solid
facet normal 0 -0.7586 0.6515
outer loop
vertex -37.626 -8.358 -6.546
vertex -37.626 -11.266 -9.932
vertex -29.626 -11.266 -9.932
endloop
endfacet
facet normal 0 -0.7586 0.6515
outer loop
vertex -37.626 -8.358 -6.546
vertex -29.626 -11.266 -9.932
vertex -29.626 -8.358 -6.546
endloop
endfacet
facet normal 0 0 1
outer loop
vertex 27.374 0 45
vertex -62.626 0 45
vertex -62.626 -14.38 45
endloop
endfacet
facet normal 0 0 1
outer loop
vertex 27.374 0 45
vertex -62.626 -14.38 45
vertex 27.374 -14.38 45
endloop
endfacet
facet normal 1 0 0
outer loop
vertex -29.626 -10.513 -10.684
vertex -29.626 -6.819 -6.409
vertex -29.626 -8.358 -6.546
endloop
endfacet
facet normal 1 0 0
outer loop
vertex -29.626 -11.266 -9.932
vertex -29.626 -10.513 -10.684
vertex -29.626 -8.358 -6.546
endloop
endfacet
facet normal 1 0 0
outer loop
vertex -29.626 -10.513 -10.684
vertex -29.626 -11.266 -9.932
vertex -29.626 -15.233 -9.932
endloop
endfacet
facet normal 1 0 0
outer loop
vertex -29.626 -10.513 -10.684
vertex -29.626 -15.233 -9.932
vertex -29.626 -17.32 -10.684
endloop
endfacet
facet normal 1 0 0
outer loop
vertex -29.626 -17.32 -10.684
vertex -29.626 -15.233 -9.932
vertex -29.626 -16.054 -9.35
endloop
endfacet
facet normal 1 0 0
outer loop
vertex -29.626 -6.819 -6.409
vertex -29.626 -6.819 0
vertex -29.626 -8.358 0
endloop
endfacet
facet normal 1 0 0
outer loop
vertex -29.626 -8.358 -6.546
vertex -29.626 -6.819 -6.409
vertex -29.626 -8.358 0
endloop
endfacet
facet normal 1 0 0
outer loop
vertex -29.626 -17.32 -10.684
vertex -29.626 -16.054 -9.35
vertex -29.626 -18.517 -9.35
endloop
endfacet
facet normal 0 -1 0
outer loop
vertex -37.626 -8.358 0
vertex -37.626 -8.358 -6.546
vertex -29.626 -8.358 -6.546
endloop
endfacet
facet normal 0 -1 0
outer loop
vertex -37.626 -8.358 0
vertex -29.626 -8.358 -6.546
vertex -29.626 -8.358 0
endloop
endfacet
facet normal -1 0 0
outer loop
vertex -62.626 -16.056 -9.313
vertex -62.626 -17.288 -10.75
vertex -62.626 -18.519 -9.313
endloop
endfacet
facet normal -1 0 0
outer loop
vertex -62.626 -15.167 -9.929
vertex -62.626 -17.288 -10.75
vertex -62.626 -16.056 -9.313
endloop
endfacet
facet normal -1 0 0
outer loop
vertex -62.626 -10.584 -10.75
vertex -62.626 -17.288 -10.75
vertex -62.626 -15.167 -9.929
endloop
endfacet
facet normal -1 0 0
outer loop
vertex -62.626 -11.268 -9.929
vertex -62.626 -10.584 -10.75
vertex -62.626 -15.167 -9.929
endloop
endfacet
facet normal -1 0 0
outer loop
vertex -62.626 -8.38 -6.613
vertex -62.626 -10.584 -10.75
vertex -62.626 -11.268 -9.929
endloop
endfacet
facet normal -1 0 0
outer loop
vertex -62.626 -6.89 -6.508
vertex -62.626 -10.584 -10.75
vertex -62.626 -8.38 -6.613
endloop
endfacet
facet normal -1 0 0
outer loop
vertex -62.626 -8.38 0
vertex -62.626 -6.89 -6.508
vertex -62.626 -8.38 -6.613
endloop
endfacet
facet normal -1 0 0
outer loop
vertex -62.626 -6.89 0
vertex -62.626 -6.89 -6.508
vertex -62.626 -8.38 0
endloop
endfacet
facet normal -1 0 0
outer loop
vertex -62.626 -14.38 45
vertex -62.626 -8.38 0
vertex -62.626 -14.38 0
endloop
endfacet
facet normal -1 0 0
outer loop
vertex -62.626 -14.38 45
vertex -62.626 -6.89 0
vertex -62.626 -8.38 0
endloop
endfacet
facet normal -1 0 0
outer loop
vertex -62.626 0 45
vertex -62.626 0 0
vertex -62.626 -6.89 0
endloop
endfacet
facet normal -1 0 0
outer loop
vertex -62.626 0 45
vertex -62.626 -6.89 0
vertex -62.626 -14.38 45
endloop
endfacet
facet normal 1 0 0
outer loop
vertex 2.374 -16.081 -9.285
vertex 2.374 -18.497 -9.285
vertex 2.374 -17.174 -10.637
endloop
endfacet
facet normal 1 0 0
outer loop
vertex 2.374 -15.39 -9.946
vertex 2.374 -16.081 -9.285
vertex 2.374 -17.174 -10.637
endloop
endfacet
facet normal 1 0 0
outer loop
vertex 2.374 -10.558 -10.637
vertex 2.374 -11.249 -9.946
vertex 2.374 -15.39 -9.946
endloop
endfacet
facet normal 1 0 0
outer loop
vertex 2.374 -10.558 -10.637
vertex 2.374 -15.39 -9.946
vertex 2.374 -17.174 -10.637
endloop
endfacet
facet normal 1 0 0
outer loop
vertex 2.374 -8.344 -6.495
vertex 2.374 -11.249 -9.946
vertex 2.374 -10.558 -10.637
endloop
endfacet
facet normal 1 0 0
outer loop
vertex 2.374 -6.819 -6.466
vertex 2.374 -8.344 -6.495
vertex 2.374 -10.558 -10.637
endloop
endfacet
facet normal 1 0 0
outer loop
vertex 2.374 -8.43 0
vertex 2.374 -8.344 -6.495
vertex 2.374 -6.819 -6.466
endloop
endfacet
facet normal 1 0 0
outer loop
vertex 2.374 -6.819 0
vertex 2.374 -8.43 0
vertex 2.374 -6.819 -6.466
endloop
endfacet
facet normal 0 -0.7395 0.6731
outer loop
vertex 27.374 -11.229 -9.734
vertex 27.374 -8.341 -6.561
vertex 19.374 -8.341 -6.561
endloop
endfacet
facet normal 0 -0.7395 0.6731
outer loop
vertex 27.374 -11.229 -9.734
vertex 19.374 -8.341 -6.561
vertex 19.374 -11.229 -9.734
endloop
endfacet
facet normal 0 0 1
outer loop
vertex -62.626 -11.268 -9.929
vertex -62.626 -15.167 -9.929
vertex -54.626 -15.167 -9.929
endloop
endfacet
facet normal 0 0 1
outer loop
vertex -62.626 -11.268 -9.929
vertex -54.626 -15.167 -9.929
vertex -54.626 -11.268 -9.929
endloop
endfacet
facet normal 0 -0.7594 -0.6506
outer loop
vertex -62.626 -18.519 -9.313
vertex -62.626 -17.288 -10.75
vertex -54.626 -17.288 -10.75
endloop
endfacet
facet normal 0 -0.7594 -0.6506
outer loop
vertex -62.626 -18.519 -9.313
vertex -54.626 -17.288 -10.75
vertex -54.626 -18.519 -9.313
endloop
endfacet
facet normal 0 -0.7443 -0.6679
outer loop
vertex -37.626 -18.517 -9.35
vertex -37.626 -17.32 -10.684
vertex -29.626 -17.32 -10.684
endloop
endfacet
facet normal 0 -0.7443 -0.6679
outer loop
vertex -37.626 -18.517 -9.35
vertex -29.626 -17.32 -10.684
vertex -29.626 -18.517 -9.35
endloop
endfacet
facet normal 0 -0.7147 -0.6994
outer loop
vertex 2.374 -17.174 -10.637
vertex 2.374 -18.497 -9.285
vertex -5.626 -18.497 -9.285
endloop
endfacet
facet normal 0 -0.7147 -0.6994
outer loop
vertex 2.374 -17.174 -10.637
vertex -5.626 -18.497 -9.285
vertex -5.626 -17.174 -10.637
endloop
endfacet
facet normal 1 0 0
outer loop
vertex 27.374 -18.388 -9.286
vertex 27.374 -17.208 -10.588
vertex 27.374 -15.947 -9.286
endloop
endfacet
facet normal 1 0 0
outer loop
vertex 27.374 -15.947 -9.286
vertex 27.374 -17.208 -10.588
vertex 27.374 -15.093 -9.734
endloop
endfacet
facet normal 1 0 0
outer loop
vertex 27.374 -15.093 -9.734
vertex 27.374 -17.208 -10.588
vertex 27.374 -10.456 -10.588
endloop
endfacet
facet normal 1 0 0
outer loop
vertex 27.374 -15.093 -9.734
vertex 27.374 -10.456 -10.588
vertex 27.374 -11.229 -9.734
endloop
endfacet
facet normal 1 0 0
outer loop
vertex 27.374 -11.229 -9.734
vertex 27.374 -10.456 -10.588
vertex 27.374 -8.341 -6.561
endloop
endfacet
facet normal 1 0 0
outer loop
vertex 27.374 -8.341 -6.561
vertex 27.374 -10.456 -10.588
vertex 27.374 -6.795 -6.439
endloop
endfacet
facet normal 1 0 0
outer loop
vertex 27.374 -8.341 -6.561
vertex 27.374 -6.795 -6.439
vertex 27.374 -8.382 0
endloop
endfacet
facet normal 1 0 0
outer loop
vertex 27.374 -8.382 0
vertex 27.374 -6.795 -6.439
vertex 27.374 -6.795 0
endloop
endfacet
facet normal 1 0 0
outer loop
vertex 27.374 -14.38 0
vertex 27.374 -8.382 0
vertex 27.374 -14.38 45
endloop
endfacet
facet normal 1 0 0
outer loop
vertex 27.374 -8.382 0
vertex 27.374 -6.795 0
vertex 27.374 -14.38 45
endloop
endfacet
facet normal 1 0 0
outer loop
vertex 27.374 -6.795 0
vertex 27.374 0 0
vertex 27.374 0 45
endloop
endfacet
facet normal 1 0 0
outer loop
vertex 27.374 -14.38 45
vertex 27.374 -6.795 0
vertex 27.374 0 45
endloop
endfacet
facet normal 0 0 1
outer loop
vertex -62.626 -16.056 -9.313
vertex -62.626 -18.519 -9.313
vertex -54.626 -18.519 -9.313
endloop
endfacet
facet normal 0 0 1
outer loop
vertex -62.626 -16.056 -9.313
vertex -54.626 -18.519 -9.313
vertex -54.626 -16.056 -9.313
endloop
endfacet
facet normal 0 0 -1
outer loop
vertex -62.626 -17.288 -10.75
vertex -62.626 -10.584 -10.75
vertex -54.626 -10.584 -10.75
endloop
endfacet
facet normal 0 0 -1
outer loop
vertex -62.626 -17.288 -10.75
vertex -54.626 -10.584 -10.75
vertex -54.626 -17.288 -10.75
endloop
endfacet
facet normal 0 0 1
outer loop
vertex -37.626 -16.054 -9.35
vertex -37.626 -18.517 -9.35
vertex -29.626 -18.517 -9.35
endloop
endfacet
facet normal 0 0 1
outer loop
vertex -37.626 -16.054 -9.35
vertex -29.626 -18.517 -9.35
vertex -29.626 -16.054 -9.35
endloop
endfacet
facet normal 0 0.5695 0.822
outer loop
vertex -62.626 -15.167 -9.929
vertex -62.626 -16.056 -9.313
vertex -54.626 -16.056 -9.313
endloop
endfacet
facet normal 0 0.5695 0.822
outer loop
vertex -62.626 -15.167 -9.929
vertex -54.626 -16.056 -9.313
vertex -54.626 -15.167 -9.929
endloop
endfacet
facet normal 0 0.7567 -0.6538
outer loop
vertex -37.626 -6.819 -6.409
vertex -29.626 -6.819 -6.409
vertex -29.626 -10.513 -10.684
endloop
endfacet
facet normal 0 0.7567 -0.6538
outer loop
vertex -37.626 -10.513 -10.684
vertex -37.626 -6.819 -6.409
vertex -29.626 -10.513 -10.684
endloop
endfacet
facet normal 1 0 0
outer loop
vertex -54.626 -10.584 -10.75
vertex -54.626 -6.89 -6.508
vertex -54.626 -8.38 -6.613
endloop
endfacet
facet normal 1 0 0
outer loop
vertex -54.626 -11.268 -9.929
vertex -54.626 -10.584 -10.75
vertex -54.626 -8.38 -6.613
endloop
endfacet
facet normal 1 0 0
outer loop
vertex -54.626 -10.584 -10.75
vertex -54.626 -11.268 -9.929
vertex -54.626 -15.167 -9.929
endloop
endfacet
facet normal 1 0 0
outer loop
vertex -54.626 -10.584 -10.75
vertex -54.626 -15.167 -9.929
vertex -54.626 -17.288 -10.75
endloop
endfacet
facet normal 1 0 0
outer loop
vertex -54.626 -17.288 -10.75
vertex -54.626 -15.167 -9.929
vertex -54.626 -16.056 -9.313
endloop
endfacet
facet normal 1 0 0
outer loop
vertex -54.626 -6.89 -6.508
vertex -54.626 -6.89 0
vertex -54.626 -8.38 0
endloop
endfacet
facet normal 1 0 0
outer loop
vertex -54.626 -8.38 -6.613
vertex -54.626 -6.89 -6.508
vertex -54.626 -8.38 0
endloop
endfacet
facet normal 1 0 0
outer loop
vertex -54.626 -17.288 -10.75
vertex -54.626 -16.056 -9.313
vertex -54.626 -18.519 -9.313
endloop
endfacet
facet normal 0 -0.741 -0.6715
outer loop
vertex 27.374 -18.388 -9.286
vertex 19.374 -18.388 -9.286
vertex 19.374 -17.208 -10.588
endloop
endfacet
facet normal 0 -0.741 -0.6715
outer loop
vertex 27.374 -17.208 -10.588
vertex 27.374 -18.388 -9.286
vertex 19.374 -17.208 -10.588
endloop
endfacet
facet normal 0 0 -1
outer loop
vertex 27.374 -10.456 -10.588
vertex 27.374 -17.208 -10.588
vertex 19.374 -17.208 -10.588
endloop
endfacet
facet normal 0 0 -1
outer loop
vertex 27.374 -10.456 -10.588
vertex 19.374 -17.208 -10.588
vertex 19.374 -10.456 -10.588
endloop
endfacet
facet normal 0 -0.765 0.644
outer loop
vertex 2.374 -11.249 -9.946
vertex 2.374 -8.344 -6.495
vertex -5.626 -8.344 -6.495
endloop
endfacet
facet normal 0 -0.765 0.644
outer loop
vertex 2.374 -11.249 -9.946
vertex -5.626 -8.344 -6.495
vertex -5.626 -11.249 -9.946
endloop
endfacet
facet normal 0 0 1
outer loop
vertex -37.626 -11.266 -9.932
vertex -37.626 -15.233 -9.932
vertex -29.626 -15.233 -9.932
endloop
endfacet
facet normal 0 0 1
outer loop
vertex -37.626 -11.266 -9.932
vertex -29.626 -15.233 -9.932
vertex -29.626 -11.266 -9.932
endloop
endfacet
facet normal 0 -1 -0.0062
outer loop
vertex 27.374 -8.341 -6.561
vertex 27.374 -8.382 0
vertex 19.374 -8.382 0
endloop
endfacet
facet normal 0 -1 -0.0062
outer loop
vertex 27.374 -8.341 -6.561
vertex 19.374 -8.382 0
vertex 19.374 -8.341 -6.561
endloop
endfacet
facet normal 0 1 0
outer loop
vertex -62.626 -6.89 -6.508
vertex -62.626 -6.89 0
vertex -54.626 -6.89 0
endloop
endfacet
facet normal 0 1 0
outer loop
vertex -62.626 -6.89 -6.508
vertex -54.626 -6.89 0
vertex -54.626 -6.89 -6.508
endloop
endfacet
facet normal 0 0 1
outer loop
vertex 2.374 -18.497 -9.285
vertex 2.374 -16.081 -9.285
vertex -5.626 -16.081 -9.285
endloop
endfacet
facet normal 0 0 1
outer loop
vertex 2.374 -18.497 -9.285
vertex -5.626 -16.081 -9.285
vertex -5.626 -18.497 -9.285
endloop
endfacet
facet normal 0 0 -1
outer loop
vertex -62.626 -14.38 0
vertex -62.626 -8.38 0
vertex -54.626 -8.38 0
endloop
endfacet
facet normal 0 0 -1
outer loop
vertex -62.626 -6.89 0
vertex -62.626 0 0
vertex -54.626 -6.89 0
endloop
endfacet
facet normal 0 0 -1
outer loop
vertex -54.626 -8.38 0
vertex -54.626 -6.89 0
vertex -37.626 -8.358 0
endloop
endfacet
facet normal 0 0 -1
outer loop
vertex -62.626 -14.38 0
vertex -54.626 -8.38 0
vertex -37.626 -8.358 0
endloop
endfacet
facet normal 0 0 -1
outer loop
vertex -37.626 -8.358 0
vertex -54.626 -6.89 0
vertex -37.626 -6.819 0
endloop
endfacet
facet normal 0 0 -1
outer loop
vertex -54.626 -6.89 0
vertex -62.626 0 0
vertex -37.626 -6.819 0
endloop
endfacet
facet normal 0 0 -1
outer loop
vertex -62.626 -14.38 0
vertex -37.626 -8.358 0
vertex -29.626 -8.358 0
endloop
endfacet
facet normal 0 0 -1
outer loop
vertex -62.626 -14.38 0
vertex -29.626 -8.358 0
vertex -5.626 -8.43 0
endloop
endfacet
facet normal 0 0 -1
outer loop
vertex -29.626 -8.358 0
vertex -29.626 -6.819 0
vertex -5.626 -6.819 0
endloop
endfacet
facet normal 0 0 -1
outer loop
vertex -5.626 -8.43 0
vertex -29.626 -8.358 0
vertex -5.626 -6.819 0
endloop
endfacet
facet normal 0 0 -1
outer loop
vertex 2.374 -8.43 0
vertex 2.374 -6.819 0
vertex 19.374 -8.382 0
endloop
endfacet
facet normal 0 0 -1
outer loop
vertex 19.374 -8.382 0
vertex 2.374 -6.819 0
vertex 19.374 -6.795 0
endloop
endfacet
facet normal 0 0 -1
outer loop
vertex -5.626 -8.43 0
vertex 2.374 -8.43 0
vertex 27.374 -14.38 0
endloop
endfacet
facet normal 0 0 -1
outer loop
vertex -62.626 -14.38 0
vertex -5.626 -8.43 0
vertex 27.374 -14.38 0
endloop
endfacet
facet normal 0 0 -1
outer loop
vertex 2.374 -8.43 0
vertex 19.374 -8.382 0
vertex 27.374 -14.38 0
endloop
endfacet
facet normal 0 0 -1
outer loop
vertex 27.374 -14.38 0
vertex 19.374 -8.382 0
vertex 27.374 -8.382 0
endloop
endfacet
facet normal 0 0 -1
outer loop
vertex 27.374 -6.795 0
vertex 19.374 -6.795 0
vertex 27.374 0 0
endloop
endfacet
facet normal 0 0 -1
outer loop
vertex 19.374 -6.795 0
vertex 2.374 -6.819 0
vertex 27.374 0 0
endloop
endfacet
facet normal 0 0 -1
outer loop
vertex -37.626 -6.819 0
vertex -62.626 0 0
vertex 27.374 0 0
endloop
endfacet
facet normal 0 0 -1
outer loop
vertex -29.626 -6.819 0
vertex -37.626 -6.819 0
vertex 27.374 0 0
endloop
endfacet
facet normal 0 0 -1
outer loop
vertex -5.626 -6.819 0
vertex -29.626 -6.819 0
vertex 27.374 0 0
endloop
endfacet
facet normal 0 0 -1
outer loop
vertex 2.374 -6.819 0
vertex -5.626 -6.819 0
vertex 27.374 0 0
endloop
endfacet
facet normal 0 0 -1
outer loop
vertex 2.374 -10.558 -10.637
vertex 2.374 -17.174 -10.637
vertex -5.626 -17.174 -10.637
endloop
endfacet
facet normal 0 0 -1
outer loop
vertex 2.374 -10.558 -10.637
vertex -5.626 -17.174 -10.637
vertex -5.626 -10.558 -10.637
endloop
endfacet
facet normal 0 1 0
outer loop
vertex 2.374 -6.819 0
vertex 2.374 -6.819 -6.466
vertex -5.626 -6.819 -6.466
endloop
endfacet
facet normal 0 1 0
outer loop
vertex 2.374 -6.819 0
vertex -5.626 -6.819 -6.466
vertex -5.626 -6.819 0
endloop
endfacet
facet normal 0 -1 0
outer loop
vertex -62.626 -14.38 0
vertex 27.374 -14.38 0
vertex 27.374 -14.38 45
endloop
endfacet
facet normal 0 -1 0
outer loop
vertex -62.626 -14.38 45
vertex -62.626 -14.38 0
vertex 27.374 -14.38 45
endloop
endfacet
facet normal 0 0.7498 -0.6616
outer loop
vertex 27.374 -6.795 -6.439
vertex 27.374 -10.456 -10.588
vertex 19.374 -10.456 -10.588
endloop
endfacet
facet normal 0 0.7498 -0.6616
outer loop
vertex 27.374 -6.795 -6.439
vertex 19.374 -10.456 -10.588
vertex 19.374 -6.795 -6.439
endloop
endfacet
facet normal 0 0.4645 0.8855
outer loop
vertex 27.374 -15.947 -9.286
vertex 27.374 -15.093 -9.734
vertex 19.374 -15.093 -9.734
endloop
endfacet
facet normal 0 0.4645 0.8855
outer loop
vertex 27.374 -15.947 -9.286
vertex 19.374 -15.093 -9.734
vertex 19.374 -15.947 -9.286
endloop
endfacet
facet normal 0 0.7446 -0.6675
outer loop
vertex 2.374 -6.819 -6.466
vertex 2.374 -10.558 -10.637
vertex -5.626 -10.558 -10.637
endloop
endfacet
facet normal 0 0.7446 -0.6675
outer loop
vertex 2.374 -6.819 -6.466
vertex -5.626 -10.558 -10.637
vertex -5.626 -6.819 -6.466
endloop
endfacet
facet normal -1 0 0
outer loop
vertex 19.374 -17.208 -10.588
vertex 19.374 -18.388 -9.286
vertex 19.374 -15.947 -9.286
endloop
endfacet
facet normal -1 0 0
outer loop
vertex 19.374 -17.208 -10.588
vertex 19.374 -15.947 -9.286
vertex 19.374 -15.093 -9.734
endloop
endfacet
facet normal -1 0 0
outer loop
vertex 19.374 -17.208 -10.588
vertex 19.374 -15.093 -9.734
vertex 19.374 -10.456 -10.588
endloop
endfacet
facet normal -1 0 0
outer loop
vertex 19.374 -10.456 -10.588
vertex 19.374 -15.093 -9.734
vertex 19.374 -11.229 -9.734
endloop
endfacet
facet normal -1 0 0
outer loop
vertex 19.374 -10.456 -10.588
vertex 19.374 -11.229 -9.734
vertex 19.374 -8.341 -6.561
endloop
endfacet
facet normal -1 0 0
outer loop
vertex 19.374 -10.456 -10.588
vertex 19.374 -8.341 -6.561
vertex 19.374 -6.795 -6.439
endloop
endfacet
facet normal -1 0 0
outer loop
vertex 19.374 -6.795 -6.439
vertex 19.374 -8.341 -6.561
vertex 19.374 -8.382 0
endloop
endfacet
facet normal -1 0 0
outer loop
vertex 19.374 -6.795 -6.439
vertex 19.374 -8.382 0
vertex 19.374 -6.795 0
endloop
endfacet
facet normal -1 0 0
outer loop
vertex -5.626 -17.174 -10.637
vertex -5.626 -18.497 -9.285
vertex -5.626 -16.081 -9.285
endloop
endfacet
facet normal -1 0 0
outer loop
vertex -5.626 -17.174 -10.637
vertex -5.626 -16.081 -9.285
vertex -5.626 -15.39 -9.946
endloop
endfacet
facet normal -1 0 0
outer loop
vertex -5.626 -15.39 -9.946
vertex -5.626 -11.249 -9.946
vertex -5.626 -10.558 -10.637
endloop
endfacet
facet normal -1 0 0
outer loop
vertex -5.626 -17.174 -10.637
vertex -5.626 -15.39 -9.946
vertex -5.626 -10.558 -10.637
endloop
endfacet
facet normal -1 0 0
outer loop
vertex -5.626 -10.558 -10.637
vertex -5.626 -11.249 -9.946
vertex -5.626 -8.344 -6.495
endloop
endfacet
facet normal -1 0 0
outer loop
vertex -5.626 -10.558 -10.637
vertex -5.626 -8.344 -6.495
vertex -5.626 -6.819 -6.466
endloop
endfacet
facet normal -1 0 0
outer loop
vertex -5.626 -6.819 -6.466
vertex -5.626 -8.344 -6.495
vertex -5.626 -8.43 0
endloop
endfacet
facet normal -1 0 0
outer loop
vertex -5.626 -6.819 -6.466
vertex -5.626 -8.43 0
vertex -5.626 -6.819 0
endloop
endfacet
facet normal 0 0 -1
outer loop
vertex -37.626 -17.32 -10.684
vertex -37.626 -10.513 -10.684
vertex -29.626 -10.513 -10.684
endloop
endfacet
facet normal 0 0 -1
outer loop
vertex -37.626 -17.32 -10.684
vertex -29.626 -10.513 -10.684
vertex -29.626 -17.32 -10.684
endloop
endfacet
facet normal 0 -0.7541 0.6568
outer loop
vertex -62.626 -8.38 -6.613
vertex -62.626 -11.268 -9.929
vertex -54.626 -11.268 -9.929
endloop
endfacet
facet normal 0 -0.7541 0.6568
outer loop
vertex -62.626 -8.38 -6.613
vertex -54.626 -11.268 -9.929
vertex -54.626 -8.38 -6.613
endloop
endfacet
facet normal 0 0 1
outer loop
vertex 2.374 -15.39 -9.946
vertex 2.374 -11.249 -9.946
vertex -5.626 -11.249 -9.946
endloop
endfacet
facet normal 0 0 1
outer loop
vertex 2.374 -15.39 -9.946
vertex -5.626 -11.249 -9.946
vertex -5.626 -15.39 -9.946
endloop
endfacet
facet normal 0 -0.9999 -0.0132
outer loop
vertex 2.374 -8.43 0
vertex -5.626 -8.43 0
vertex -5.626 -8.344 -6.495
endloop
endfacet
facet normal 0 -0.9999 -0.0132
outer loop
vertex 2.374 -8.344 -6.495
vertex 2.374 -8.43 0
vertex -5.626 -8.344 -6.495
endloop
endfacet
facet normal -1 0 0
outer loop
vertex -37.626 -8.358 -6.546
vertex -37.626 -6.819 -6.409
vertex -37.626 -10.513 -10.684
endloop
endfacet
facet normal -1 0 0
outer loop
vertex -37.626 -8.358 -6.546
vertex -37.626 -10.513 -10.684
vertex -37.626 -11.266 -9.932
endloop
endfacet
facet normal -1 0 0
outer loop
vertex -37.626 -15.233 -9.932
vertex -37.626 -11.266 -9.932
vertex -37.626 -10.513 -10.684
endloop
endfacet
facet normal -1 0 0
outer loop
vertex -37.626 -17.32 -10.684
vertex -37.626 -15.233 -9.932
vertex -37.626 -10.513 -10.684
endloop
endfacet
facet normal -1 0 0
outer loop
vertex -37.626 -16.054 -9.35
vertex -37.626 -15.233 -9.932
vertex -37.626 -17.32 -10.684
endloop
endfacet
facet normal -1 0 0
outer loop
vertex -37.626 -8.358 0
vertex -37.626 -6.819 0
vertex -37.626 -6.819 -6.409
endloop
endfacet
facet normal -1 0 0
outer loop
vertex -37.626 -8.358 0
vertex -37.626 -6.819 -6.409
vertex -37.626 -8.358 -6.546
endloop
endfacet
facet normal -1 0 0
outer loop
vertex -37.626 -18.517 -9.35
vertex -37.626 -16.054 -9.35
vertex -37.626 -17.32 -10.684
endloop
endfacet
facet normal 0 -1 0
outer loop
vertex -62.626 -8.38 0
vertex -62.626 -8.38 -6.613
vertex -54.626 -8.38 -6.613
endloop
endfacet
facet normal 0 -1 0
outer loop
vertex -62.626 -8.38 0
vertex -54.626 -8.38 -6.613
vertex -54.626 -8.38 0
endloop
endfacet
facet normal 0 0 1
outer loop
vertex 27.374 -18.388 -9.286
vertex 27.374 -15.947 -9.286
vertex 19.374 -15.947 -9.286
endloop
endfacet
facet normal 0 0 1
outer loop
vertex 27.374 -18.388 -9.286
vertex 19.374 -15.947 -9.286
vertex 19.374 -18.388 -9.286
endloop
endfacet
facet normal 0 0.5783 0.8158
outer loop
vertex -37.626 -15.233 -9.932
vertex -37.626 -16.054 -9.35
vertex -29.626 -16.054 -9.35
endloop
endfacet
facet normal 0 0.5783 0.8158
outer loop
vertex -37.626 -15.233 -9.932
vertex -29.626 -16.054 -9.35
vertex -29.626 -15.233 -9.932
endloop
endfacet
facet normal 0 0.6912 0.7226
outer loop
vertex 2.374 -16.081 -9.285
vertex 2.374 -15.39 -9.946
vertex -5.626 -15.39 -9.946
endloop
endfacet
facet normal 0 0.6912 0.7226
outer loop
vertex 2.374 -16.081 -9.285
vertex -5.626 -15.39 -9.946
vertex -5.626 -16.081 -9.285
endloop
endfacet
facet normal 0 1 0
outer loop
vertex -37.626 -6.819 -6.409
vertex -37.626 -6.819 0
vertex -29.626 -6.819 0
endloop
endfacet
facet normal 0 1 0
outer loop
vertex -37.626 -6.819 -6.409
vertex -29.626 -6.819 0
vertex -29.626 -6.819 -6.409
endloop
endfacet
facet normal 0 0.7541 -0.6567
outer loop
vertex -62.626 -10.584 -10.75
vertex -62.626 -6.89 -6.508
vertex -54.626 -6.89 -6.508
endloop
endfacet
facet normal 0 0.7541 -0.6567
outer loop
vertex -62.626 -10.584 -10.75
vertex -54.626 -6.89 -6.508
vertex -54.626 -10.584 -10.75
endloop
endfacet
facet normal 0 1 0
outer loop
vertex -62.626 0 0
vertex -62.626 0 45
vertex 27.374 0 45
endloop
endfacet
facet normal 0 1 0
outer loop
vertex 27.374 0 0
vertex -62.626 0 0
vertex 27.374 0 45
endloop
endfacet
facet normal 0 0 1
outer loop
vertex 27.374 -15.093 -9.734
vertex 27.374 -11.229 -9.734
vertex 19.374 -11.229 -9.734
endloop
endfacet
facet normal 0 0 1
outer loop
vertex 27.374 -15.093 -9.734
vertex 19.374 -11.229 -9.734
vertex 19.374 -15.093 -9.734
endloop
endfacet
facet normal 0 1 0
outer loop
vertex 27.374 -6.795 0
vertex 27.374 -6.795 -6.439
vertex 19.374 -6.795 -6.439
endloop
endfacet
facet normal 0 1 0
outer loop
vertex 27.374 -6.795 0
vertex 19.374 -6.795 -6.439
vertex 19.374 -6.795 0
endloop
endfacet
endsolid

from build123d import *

# Parameters (mm, degrees)
F0_W      = 90
F0_H      = 45
F1_DEPTH  = 25
F3_DEPTH  = 8
F6_DEPTH  = 8
F8_DEPTH  = 8
F11_DEPTH = 8
F13_DEPTH = 100


with BuildPart() as f1:
    # F0 (on Front) → F1 (new body)
    with BuildSketch(Plane.XZ):
        with Locations((-17.625819491, 22.5)):
            Rectangle(F0_W, F0_H)
    extrude(amount=F1_DEPTH)

    # F2 (on face) → F3 (join)
    with BuildSketch(Plane(origin=(-62.625819491, 0, 0), x_dir=(0, -1, 0), z_dir=(-1, 0, 0))):
        Polygon((8.3801829397, 0), (6.88952161, 0), (6.88952161, -6.5082041547), (10.5835897848, -10.7495421544), (17.287639901, -10.7495421544), (18.5189954937, -9.3129593879), (16.0562843084, -9.3129593879), (15.1669709012, -9.9286381155), (11.2676769495, -9.9286381155), (8.3801829397, -6.6133668514), align=None)
    extrude(amount=-F3_DEPTH)

    # F5 (on offset) → F6 (join)
    with BuildSketch(Plane(origin=(-37.625819491, 0, 0), x_dir=(0, -1, 0), z_dir=(-1, 0, 0))):
        Polygon((8.3582568914, 0), (6.8190610036, 0), (6.8190610036, -6.4087822102), (10.5131296441, -10.6843244284), (17.3197928816, -10.6843244284), (18.5169447213, -9.3503547832), (16.0542316735, -9.3503547832), (15.233328566, -9.931829758), (11.2656243145, -9.931829758), (8.3582568914, -6.5456000157), align=None)
    extrude(amount=-F6_DEPTH)

    # F7 (on face) → F8 (join)
    with BuildSketch(Plane.YZ.offset(27.374180509)):
        Polygon((-6.7952279933, 0), (-8.3815939724, 0), (-8.3409175277, -6.5609556623), (-11.2289162353, -9.7336871549), (-15.0931403041, -9.7336871549), (-15.9473381937, -9.2862509191), (-18.3878988028, -9.2862509191), (-17.208294943, -10.5878841132), (-10.4560721666, -10.5878841132), (-6.7952279933, -6.438927725), align=None)
    extrude(amount=-F8_DEPTH)

    # F10 (on offset) → F11 (join)
    with BuildSketch(Plane.YZ.offset(2.374180509)):
        Polygon((-6.8191965111, 0), (-8.4298858419, 0), (-8.3435988054, -6.4949798398), (-11.248591356, -9.946456179), (-15.3903635219, -9.946456179), (-16.0806588829, -9.2849237844), (-18.4966921806, -9.2849237844), (-17.1736273915, -10.63675154), (-10.558295995, -10.63675154), (-6.8191965111, -6.4662178047), align=None)
    extrude(amount=-F11_DEPTH)

    # F12 (on face) → F13 (cut)
    with BuildSketch(Plane.YZ.offset(27.374180509)):
        Polygon((-14.3797518685, -0.9674453177), (-14.3797518685, 0), (-14.3797518685, 45.9536239505), (-25.8923433721, 45.9536239505), (-25.8923433721, -0.9674453177), align=None)
    extrude(amount=-F13_DEPTH, mode=Mode.SUBTRACT)


solid = f1.part
